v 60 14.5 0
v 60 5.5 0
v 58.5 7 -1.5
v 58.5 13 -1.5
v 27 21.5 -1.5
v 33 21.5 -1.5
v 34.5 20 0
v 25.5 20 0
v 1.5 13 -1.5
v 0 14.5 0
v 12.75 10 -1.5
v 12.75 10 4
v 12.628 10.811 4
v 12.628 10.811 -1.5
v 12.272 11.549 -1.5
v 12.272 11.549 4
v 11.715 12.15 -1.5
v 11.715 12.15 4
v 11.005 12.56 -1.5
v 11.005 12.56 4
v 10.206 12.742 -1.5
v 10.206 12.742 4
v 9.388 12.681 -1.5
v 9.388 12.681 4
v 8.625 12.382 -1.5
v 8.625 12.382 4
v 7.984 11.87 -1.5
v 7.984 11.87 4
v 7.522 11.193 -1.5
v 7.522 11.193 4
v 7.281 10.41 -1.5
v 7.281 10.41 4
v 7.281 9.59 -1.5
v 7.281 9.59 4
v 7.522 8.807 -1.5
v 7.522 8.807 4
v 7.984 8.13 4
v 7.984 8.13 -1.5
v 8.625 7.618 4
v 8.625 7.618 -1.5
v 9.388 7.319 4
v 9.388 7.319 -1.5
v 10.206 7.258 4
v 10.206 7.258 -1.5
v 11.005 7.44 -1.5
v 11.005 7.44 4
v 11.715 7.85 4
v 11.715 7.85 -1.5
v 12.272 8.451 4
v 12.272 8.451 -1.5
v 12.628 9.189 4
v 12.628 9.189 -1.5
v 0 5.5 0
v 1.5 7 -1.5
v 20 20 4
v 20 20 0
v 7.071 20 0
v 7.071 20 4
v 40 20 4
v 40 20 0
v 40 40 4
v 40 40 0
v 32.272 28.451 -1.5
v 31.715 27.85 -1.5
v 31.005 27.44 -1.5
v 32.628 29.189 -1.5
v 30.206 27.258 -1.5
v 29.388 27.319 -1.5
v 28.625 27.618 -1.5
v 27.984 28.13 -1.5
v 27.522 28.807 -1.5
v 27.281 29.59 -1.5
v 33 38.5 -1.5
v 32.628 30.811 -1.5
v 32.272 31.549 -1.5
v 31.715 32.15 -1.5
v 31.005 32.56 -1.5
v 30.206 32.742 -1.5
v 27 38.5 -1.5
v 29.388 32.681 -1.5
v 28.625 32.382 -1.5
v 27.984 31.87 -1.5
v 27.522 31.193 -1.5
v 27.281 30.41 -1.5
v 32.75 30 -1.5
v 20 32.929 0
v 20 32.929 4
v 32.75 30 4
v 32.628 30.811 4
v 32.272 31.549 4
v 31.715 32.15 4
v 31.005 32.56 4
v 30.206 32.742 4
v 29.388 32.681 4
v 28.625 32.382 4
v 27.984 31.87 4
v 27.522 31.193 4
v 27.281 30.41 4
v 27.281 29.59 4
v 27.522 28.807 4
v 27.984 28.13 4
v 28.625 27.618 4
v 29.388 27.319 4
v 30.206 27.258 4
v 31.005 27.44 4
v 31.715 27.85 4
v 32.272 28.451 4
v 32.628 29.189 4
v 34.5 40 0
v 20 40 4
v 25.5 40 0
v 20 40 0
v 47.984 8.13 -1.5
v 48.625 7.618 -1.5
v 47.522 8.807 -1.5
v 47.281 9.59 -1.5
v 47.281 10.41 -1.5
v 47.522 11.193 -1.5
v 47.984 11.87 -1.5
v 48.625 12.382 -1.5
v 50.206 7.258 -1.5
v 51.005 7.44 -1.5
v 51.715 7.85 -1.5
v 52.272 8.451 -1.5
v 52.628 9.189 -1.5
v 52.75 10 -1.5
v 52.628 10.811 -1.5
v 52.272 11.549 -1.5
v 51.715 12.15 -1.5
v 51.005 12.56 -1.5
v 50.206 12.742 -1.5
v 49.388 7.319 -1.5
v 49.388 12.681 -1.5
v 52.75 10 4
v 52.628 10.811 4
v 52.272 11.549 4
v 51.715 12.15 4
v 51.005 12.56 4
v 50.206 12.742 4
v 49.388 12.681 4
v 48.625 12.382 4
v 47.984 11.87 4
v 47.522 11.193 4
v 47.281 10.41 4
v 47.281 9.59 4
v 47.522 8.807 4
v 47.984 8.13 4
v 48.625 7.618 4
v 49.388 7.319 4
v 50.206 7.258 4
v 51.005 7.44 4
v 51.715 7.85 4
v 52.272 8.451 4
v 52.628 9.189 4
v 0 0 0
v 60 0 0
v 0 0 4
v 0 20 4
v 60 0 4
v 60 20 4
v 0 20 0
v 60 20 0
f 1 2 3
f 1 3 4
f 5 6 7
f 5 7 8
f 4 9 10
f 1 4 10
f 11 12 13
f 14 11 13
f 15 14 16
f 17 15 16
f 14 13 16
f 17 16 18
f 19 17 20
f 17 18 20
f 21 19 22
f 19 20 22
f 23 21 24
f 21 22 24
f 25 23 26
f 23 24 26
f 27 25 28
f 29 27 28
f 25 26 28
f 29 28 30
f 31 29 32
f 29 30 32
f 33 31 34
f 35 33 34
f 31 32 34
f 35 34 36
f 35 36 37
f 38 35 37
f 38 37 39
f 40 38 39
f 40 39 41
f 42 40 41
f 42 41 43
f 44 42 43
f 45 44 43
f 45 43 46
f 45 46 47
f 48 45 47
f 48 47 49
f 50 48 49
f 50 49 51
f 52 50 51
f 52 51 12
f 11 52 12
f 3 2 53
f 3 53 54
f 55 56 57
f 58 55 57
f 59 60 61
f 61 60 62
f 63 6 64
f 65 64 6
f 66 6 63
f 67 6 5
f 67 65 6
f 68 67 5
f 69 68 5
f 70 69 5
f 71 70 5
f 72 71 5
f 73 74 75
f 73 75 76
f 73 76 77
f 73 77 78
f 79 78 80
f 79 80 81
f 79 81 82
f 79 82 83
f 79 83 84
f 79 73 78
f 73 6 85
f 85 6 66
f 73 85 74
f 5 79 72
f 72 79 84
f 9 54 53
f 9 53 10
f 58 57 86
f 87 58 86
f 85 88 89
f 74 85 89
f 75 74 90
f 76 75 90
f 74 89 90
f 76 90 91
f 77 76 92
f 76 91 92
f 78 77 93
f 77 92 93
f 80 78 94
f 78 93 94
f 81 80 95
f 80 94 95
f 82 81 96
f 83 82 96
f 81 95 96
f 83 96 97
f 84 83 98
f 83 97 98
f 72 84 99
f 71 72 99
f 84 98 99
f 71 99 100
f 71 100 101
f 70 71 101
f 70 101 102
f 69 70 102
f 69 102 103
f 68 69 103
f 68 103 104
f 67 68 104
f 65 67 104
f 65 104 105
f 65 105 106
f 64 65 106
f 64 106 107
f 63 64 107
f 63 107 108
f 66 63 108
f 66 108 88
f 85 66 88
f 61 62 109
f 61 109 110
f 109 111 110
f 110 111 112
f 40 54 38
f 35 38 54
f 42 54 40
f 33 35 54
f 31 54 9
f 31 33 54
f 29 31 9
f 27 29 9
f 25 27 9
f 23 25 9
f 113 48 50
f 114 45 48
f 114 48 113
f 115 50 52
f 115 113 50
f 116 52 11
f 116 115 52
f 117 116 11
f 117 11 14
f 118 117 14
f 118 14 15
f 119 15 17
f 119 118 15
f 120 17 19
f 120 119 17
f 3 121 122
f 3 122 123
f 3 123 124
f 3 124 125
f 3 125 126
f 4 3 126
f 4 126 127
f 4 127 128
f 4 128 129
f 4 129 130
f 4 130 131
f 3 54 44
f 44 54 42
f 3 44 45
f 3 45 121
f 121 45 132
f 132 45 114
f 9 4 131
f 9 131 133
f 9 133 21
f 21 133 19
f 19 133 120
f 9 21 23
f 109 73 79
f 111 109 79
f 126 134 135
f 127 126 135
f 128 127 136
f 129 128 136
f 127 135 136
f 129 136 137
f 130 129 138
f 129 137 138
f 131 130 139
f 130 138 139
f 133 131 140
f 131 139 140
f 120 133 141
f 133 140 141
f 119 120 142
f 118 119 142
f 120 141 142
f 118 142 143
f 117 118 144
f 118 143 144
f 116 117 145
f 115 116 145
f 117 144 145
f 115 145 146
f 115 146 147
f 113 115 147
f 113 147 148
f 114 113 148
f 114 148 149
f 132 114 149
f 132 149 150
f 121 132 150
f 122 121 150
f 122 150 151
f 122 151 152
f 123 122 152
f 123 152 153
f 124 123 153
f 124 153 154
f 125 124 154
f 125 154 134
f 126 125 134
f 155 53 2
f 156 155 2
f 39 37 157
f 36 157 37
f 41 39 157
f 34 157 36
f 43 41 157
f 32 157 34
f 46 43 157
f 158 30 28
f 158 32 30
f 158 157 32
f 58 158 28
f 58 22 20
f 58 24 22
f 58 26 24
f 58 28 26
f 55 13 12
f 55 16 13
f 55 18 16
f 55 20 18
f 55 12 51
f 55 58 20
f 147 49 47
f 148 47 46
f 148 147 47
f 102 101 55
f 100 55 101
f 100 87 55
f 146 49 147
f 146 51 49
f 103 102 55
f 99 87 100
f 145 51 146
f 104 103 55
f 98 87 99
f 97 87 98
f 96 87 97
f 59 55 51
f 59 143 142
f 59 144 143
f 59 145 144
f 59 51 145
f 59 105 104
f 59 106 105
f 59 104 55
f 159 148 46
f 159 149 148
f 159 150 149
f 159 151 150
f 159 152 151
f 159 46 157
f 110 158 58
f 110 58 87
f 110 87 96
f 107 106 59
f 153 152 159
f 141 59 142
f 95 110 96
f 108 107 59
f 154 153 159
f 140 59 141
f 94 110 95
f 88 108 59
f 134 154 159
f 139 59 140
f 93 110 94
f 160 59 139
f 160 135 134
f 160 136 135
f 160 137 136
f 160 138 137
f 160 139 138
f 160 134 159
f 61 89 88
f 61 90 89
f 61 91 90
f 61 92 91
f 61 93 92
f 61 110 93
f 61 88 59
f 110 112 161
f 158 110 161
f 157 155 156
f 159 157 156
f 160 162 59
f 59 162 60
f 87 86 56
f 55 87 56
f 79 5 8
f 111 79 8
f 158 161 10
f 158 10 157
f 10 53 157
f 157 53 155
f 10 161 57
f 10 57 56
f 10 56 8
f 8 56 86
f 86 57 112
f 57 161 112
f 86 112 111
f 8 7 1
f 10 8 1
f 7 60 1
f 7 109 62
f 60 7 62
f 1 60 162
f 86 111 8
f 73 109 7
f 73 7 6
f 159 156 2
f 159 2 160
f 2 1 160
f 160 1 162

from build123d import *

# Parameters (mm, degrees)
F1_DEPTH = 4
F3_DEPTH = 60
F5_DEPTH = 20
F6_SIZE  = 1.49999
F7_R     = 2.75
F8_DEPTH = 5.501


# Not quite as in the source:
# - a fillet or chamfer is up to 0.001 mm smaller than in the source, because OpenCascade refuses the exact size


with BuildPart() as f1:
    # F0 (on Top) → F1 (new body)
    with BuildSketch(Plane.XY):
        Polygon((0, 20), (0, 0), (60, 0), (60, 20), (40, 20), (40, 40), (20, 40), align=None)
        Polygon((20, 32.9289321881), (20, 20), (7.0710678119, 20), align=None, mode=Mode.SUBTRACT)
    extrude(amount=F1_DEPTH)

    # F2 (on face) → F3 (join, through all)
    with BuildSketch(Plane.YZ.offset(60)):
        Polygon((14.5, 0), (5.5, 0), (7, -1.5), (13, -1.5), align=None)
    extrude(amount=-F3_DEPTH)

    # F4 (on face) → F5 (join, through all)
    with BuildSketch(Plane(origin=(0, 40, 0), x_dir=(-1, 0, 0), z_dir=(0, 1, 0))):
        Polygon((-25.5, 0), (-34.5, 0), (-33, -1.5), (-27, -1.5), align=None)
    extrude(amount=-F5_DEPTH)

    # F6 (size 1.5 in the source; OpenCascade refuses exactly that, so slightly less here)
    f6_edges = [f1.edges().sort_by_distance(p)[0] for p in [
        (60, 10, -1.5),
        (0, 10, -1.5),
        (30, 20, -1.5),
        (30, 40, -1.5),
    ]]
    chamfer(f6_edges, length=F6_SIZE)

    # F7 (on face) → F8 (cut, through all)
    with BuildSketch(Plane.XY.offset(4)):
        with Locations((30, 30)):
            Circle(F7_R)
        with Locations((10, 10)):
            Circle(F7_R)
        with Locations((50, 10)):
            Circle(F7_R)
    extrude(amount=-F8_DEPTH, mode=Mode.SUBTRACT)


solid = f1.part
